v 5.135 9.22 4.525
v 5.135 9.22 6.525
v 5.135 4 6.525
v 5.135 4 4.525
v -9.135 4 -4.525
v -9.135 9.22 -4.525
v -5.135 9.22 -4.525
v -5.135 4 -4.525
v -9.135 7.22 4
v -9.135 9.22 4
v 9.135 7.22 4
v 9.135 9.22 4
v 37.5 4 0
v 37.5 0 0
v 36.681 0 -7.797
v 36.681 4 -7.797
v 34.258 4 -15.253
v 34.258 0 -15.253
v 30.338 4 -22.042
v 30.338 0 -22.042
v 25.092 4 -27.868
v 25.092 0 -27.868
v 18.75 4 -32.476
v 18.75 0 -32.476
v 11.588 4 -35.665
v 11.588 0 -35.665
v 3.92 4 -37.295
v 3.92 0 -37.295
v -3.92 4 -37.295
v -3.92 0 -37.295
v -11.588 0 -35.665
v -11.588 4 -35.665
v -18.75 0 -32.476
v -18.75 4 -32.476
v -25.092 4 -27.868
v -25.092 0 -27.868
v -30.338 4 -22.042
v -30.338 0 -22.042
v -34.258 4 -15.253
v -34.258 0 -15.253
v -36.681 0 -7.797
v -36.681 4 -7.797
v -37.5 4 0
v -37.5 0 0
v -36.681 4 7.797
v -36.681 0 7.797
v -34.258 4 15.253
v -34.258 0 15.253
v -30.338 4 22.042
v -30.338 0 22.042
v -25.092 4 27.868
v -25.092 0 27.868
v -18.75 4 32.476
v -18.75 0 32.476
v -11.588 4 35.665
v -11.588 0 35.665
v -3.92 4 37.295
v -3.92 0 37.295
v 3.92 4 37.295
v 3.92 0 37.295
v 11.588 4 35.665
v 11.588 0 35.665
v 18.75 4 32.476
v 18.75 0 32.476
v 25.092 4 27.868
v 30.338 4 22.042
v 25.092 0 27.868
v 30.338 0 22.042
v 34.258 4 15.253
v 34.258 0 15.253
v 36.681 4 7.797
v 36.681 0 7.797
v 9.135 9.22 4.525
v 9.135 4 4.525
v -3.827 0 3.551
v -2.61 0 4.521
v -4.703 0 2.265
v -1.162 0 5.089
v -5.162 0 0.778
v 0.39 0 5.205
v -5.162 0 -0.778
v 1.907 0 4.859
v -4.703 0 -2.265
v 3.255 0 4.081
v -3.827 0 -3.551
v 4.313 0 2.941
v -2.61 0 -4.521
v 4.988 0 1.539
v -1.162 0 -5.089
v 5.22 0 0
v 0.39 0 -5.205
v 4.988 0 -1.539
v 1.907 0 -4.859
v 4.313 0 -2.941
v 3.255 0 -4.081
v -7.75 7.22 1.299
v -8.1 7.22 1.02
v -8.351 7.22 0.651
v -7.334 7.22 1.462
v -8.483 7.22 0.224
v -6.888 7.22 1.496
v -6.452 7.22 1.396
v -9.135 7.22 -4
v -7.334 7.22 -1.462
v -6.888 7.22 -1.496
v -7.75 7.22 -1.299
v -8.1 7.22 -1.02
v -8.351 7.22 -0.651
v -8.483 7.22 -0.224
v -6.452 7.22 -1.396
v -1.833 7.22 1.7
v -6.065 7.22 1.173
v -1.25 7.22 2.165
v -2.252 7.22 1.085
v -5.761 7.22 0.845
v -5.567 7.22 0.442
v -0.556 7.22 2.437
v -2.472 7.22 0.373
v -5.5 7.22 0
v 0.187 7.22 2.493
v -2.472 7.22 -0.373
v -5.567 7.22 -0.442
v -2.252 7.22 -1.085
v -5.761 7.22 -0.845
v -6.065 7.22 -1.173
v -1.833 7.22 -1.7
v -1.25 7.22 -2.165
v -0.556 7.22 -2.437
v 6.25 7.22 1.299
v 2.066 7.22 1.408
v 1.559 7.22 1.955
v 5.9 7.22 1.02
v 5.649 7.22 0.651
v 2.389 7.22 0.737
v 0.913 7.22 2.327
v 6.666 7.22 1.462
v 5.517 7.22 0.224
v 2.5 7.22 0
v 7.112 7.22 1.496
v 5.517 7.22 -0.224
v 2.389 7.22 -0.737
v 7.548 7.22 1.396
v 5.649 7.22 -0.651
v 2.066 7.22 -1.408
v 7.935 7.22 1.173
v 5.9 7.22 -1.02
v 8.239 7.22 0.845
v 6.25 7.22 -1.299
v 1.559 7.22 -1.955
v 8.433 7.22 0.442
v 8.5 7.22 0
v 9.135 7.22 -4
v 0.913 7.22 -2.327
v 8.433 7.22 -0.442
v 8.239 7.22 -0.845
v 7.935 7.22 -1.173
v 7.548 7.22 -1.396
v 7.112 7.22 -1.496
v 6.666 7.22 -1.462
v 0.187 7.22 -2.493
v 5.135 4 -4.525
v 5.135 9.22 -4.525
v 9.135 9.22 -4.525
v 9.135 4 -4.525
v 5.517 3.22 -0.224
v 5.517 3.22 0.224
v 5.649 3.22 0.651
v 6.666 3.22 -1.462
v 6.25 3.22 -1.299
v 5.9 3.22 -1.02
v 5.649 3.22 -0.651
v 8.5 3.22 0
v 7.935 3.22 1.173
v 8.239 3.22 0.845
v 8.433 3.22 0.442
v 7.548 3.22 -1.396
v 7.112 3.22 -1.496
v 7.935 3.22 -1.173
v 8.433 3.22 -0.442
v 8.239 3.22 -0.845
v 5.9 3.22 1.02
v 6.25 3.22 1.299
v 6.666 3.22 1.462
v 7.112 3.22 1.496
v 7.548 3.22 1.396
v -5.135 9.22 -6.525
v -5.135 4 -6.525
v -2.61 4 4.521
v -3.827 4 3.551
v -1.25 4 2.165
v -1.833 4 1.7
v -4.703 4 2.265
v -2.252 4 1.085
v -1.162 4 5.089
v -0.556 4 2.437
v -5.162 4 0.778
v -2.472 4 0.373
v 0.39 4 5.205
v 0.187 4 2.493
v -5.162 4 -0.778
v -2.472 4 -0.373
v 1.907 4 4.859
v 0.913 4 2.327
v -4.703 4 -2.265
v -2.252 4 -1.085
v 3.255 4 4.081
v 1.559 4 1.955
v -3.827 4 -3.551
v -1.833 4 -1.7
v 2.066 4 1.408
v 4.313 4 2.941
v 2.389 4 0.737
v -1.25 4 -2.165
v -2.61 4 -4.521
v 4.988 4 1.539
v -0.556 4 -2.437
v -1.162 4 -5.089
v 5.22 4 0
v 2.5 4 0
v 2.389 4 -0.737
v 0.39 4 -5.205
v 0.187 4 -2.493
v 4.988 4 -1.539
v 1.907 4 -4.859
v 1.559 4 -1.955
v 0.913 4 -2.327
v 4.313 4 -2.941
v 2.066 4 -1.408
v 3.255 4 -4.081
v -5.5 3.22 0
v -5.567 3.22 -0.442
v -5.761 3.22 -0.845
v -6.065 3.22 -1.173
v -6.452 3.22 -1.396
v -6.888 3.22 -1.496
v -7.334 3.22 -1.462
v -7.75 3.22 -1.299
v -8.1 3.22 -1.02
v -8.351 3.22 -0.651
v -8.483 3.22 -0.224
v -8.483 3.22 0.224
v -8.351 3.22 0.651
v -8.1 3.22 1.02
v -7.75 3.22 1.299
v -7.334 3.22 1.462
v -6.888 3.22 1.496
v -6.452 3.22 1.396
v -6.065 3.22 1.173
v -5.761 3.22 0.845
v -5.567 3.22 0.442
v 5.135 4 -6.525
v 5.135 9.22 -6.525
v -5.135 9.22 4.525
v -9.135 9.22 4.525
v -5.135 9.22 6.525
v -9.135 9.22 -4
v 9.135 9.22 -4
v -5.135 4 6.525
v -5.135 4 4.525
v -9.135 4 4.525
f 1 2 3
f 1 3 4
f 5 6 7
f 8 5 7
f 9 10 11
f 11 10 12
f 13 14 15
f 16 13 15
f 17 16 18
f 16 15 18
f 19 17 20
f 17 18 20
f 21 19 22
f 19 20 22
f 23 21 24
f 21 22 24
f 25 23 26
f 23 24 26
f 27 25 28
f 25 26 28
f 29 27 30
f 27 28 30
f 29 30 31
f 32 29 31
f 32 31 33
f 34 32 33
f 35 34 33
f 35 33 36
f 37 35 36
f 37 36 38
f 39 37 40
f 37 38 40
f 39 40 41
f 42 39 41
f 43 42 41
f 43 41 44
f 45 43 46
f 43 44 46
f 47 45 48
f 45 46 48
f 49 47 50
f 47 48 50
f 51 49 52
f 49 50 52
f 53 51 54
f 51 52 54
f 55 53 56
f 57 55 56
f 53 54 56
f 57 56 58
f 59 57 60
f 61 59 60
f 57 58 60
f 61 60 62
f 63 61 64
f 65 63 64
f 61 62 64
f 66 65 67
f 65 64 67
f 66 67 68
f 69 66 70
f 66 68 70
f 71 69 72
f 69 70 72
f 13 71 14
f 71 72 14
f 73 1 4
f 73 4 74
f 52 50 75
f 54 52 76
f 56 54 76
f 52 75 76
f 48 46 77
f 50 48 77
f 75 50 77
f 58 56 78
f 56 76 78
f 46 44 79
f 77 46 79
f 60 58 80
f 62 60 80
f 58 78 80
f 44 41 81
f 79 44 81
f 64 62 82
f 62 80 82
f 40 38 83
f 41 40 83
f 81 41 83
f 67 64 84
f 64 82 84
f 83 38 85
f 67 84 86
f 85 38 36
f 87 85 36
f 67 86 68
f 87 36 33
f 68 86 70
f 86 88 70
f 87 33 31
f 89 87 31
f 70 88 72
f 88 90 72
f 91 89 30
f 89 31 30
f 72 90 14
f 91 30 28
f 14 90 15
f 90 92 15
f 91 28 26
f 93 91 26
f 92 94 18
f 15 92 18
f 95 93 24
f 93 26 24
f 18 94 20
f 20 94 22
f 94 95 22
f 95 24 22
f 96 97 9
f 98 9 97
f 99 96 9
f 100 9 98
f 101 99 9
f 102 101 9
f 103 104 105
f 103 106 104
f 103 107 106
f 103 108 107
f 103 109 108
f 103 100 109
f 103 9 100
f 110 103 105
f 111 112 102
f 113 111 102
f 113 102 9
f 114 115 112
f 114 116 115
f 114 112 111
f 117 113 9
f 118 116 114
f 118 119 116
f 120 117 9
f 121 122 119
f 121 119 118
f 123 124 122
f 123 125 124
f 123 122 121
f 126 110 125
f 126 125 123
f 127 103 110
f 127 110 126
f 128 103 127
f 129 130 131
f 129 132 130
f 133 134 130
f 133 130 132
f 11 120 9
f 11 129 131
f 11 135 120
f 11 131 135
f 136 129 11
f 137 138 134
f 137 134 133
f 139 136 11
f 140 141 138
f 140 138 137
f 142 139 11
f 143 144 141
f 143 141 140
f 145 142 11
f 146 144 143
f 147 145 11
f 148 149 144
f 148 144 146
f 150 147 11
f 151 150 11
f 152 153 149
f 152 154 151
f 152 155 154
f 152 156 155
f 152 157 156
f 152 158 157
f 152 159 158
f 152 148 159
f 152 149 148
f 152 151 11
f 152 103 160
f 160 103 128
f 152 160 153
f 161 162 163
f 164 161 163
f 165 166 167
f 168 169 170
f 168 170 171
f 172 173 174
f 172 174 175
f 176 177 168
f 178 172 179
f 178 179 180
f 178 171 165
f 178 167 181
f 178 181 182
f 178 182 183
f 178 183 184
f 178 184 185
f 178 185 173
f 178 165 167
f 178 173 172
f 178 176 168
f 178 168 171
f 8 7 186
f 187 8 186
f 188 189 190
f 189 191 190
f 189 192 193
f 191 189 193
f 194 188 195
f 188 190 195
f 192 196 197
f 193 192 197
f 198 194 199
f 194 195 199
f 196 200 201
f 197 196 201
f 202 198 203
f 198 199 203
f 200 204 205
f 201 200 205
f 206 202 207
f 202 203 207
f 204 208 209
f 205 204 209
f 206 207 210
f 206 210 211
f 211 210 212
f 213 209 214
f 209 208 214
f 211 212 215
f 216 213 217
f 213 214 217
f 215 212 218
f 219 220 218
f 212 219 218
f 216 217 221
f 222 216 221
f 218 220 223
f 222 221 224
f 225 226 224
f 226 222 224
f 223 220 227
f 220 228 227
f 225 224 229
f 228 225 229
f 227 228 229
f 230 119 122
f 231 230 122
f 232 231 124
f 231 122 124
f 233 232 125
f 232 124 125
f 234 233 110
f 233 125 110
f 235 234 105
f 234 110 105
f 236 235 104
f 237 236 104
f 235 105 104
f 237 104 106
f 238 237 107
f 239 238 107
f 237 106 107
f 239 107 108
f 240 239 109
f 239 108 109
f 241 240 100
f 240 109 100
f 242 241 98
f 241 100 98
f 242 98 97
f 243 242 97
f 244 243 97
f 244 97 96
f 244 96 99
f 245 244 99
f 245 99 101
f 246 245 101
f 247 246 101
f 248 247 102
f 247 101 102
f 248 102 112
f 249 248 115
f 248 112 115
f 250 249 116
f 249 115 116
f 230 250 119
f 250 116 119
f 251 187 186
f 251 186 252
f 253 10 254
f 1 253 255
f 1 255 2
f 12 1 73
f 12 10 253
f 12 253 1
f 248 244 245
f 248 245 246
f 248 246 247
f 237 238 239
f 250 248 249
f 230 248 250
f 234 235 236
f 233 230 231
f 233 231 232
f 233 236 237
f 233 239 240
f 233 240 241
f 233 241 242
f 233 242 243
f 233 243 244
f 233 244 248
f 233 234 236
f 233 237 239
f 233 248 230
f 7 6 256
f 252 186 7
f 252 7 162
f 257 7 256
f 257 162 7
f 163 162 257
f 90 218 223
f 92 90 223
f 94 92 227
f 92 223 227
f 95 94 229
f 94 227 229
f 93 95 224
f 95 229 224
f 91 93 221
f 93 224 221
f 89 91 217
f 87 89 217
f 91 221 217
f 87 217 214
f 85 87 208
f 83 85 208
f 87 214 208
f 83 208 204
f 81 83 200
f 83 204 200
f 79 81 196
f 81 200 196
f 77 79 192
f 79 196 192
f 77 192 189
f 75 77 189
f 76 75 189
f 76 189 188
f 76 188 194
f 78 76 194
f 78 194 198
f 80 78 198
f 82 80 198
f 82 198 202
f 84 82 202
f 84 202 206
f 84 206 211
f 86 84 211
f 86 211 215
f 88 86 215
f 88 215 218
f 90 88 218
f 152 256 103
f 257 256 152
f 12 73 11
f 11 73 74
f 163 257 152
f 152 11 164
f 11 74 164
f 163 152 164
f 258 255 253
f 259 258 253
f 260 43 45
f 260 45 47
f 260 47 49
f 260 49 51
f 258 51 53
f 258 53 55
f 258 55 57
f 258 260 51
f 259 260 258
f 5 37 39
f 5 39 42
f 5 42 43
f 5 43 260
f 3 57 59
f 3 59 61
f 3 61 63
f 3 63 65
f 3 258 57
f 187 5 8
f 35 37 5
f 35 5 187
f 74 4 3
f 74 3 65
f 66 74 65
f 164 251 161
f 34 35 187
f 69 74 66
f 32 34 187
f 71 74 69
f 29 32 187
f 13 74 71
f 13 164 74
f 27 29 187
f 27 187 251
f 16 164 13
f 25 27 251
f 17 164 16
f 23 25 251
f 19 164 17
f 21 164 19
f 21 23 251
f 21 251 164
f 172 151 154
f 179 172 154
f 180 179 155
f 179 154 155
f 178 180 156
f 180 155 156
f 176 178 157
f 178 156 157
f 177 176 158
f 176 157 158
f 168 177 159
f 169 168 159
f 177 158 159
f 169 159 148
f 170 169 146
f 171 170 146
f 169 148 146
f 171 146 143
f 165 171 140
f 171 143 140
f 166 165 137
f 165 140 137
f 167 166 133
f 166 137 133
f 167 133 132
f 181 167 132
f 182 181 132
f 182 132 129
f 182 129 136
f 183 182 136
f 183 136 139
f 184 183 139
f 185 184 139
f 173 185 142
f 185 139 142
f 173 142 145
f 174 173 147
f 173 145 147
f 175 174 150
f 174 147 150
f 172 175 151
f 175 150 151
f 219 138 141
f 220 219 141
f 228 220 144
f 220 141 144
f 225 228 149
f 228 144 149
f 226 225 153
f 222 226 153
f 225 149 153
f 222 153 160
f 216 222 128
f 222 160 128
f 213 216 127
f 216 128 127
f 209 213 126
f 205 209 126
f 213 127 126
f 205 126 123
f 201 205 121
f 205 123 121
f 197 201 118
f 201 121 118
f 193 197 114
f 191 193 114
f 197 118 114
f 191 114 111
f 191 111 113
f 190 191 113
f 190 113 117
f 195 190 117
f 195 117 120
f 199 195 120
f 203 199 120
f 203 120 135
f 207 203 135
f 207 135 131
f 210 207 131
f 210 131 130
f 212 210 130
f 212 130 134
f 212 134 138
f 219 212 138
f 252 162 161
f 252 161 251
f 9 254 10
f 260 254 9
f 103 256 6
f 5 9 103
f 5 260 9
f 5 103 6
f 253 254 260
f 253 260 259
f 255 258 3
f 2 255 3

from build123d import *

# Parameters (mm, degrees)
SKETCH1_R           = 37.5
BOSS_EXTRUDE1_DEPTH = 4
SKETCH2_R           = 5.22
CUT_EXTRUDE1_DEPTH  = 13.05
SKETCH3_W           = 18.27
SKETCH3_H           = 13.05
BOSS_EXTRUDE2_DEPTH = 5.22
SKETCH4_W           = 4
SKETCH4_H           = 2
CUT_EXTRUDE2_DEPTH  = 5.22
SKETCH5_W           = 53.664550202
SKETCH5_H           = 8
CUT_EXTRUDE3_DEPTH  = 2
SKETCH6_R           = 1.5
CUT_EXTRUDE4_DEPTH  = 4
SKETCH7_R           = 2.5
CUT_EXTRUDE5_DEPTH  = 8.22


with BuildPart() as part:
    # Sketch1 → Boss-Extrude1 (new body)
    with BuildSketch(Plane(origin=(0, 0, 0), x_dir=(1, 0, 0), z_dir=(0, 1, 0))):
        Circle(SKETCH1_R)
    extrude(amount=BOSS_EXTRUDE1_DEPTH)

    # Sketch2 → Cut-Extrude1 (cut)
    with BuildSketch(Plane(origin=(0, 4, 0), x_dir=(1, 0, 0), z_dir=(0, 1, 0))):
        Circle(SKETCH2_R)
    extrude(amount=-CUT_EXTRUDE1_DEPTH, mode=Mode.SUBTRACT)

    # Sketch3 → Boss-Extrude2 (add)
    with BuildSketch(Plane(origin=(0, 4, 0), x_dir=(1, 0, 0), z_dir=(0, 1, 0))):
        Rectangle(SKETCH3_W, SKETCH3_H)
    extrude(amount=BOSS_EXTRUDE2_DEPTH)

    # Sketch4 → Cut-Extrude2 (cut)
    with BuildSketch(Plane(origin=(0, 9.22, 0), x_dir=(1, 0, 0), z_dir=(0, 1, 0))):
        with Locations((-7.135, -5.525)):
            Rectangle(SKETCH4_W, SKETCH4_H)
        with Locations((-7.135, 5.525)):
            Rectangle(SKETCH4_W, SKETCH4_H)
        with Locations((7.135, 5.525)):
            Rectangle(SKETCH4_W, SKETCH4_H)
        with Locations((7.135, -5.525)):
            Rectangle(SKETCH4_W, SKETCH4_H)
    extrude(amount=-CUT_EXTRUDE2_DEPTH, mode=Mode.SUBTRACT)

    # Sketch5 → Cut-Extrude3 (cut)
    with BuildSketch(Plane(origin=(0, 9.22, 0), x_dir=(1, 0, 0), z_dir=(0, 1, 0))):
        Rectangle(SKETCH5_W, SKETCH5_H)
    extrude(amount=-CUT_EXTRUDE3_DEPTH, mode=Mode.SUBTRACT)

    # Sketch6 → Cut-Extrude4 (cut)
    with BuildSketch(Plane(origin=(0, 7.22, 0), x_dir=(1, 0, 0), z_dir=(0, 1, 0))):
        with Locations((-7, 0)):
            Circle(SKETCH6_R)
        with Locations((7, 0)):
            Circle(SKETCH6_R)
    extrude(amount=-CUT_EXTRUDE4_DEPTH, mode=Mode.SUBTRACT)

    # Sketch7 → Cut-Extrude5 (cut, through all)
    with BuildSketch(Plane(origin=(0, 7.22, 0), x_dir=(1, 0, 0), z_dir=(0, 1, 0))):
        Circle(SKETCH7_R)
    extrude(amount=-CUT_EXTRUDE5_DEPTH, mode=Mode.SUBTRACT)


solid = part.part
